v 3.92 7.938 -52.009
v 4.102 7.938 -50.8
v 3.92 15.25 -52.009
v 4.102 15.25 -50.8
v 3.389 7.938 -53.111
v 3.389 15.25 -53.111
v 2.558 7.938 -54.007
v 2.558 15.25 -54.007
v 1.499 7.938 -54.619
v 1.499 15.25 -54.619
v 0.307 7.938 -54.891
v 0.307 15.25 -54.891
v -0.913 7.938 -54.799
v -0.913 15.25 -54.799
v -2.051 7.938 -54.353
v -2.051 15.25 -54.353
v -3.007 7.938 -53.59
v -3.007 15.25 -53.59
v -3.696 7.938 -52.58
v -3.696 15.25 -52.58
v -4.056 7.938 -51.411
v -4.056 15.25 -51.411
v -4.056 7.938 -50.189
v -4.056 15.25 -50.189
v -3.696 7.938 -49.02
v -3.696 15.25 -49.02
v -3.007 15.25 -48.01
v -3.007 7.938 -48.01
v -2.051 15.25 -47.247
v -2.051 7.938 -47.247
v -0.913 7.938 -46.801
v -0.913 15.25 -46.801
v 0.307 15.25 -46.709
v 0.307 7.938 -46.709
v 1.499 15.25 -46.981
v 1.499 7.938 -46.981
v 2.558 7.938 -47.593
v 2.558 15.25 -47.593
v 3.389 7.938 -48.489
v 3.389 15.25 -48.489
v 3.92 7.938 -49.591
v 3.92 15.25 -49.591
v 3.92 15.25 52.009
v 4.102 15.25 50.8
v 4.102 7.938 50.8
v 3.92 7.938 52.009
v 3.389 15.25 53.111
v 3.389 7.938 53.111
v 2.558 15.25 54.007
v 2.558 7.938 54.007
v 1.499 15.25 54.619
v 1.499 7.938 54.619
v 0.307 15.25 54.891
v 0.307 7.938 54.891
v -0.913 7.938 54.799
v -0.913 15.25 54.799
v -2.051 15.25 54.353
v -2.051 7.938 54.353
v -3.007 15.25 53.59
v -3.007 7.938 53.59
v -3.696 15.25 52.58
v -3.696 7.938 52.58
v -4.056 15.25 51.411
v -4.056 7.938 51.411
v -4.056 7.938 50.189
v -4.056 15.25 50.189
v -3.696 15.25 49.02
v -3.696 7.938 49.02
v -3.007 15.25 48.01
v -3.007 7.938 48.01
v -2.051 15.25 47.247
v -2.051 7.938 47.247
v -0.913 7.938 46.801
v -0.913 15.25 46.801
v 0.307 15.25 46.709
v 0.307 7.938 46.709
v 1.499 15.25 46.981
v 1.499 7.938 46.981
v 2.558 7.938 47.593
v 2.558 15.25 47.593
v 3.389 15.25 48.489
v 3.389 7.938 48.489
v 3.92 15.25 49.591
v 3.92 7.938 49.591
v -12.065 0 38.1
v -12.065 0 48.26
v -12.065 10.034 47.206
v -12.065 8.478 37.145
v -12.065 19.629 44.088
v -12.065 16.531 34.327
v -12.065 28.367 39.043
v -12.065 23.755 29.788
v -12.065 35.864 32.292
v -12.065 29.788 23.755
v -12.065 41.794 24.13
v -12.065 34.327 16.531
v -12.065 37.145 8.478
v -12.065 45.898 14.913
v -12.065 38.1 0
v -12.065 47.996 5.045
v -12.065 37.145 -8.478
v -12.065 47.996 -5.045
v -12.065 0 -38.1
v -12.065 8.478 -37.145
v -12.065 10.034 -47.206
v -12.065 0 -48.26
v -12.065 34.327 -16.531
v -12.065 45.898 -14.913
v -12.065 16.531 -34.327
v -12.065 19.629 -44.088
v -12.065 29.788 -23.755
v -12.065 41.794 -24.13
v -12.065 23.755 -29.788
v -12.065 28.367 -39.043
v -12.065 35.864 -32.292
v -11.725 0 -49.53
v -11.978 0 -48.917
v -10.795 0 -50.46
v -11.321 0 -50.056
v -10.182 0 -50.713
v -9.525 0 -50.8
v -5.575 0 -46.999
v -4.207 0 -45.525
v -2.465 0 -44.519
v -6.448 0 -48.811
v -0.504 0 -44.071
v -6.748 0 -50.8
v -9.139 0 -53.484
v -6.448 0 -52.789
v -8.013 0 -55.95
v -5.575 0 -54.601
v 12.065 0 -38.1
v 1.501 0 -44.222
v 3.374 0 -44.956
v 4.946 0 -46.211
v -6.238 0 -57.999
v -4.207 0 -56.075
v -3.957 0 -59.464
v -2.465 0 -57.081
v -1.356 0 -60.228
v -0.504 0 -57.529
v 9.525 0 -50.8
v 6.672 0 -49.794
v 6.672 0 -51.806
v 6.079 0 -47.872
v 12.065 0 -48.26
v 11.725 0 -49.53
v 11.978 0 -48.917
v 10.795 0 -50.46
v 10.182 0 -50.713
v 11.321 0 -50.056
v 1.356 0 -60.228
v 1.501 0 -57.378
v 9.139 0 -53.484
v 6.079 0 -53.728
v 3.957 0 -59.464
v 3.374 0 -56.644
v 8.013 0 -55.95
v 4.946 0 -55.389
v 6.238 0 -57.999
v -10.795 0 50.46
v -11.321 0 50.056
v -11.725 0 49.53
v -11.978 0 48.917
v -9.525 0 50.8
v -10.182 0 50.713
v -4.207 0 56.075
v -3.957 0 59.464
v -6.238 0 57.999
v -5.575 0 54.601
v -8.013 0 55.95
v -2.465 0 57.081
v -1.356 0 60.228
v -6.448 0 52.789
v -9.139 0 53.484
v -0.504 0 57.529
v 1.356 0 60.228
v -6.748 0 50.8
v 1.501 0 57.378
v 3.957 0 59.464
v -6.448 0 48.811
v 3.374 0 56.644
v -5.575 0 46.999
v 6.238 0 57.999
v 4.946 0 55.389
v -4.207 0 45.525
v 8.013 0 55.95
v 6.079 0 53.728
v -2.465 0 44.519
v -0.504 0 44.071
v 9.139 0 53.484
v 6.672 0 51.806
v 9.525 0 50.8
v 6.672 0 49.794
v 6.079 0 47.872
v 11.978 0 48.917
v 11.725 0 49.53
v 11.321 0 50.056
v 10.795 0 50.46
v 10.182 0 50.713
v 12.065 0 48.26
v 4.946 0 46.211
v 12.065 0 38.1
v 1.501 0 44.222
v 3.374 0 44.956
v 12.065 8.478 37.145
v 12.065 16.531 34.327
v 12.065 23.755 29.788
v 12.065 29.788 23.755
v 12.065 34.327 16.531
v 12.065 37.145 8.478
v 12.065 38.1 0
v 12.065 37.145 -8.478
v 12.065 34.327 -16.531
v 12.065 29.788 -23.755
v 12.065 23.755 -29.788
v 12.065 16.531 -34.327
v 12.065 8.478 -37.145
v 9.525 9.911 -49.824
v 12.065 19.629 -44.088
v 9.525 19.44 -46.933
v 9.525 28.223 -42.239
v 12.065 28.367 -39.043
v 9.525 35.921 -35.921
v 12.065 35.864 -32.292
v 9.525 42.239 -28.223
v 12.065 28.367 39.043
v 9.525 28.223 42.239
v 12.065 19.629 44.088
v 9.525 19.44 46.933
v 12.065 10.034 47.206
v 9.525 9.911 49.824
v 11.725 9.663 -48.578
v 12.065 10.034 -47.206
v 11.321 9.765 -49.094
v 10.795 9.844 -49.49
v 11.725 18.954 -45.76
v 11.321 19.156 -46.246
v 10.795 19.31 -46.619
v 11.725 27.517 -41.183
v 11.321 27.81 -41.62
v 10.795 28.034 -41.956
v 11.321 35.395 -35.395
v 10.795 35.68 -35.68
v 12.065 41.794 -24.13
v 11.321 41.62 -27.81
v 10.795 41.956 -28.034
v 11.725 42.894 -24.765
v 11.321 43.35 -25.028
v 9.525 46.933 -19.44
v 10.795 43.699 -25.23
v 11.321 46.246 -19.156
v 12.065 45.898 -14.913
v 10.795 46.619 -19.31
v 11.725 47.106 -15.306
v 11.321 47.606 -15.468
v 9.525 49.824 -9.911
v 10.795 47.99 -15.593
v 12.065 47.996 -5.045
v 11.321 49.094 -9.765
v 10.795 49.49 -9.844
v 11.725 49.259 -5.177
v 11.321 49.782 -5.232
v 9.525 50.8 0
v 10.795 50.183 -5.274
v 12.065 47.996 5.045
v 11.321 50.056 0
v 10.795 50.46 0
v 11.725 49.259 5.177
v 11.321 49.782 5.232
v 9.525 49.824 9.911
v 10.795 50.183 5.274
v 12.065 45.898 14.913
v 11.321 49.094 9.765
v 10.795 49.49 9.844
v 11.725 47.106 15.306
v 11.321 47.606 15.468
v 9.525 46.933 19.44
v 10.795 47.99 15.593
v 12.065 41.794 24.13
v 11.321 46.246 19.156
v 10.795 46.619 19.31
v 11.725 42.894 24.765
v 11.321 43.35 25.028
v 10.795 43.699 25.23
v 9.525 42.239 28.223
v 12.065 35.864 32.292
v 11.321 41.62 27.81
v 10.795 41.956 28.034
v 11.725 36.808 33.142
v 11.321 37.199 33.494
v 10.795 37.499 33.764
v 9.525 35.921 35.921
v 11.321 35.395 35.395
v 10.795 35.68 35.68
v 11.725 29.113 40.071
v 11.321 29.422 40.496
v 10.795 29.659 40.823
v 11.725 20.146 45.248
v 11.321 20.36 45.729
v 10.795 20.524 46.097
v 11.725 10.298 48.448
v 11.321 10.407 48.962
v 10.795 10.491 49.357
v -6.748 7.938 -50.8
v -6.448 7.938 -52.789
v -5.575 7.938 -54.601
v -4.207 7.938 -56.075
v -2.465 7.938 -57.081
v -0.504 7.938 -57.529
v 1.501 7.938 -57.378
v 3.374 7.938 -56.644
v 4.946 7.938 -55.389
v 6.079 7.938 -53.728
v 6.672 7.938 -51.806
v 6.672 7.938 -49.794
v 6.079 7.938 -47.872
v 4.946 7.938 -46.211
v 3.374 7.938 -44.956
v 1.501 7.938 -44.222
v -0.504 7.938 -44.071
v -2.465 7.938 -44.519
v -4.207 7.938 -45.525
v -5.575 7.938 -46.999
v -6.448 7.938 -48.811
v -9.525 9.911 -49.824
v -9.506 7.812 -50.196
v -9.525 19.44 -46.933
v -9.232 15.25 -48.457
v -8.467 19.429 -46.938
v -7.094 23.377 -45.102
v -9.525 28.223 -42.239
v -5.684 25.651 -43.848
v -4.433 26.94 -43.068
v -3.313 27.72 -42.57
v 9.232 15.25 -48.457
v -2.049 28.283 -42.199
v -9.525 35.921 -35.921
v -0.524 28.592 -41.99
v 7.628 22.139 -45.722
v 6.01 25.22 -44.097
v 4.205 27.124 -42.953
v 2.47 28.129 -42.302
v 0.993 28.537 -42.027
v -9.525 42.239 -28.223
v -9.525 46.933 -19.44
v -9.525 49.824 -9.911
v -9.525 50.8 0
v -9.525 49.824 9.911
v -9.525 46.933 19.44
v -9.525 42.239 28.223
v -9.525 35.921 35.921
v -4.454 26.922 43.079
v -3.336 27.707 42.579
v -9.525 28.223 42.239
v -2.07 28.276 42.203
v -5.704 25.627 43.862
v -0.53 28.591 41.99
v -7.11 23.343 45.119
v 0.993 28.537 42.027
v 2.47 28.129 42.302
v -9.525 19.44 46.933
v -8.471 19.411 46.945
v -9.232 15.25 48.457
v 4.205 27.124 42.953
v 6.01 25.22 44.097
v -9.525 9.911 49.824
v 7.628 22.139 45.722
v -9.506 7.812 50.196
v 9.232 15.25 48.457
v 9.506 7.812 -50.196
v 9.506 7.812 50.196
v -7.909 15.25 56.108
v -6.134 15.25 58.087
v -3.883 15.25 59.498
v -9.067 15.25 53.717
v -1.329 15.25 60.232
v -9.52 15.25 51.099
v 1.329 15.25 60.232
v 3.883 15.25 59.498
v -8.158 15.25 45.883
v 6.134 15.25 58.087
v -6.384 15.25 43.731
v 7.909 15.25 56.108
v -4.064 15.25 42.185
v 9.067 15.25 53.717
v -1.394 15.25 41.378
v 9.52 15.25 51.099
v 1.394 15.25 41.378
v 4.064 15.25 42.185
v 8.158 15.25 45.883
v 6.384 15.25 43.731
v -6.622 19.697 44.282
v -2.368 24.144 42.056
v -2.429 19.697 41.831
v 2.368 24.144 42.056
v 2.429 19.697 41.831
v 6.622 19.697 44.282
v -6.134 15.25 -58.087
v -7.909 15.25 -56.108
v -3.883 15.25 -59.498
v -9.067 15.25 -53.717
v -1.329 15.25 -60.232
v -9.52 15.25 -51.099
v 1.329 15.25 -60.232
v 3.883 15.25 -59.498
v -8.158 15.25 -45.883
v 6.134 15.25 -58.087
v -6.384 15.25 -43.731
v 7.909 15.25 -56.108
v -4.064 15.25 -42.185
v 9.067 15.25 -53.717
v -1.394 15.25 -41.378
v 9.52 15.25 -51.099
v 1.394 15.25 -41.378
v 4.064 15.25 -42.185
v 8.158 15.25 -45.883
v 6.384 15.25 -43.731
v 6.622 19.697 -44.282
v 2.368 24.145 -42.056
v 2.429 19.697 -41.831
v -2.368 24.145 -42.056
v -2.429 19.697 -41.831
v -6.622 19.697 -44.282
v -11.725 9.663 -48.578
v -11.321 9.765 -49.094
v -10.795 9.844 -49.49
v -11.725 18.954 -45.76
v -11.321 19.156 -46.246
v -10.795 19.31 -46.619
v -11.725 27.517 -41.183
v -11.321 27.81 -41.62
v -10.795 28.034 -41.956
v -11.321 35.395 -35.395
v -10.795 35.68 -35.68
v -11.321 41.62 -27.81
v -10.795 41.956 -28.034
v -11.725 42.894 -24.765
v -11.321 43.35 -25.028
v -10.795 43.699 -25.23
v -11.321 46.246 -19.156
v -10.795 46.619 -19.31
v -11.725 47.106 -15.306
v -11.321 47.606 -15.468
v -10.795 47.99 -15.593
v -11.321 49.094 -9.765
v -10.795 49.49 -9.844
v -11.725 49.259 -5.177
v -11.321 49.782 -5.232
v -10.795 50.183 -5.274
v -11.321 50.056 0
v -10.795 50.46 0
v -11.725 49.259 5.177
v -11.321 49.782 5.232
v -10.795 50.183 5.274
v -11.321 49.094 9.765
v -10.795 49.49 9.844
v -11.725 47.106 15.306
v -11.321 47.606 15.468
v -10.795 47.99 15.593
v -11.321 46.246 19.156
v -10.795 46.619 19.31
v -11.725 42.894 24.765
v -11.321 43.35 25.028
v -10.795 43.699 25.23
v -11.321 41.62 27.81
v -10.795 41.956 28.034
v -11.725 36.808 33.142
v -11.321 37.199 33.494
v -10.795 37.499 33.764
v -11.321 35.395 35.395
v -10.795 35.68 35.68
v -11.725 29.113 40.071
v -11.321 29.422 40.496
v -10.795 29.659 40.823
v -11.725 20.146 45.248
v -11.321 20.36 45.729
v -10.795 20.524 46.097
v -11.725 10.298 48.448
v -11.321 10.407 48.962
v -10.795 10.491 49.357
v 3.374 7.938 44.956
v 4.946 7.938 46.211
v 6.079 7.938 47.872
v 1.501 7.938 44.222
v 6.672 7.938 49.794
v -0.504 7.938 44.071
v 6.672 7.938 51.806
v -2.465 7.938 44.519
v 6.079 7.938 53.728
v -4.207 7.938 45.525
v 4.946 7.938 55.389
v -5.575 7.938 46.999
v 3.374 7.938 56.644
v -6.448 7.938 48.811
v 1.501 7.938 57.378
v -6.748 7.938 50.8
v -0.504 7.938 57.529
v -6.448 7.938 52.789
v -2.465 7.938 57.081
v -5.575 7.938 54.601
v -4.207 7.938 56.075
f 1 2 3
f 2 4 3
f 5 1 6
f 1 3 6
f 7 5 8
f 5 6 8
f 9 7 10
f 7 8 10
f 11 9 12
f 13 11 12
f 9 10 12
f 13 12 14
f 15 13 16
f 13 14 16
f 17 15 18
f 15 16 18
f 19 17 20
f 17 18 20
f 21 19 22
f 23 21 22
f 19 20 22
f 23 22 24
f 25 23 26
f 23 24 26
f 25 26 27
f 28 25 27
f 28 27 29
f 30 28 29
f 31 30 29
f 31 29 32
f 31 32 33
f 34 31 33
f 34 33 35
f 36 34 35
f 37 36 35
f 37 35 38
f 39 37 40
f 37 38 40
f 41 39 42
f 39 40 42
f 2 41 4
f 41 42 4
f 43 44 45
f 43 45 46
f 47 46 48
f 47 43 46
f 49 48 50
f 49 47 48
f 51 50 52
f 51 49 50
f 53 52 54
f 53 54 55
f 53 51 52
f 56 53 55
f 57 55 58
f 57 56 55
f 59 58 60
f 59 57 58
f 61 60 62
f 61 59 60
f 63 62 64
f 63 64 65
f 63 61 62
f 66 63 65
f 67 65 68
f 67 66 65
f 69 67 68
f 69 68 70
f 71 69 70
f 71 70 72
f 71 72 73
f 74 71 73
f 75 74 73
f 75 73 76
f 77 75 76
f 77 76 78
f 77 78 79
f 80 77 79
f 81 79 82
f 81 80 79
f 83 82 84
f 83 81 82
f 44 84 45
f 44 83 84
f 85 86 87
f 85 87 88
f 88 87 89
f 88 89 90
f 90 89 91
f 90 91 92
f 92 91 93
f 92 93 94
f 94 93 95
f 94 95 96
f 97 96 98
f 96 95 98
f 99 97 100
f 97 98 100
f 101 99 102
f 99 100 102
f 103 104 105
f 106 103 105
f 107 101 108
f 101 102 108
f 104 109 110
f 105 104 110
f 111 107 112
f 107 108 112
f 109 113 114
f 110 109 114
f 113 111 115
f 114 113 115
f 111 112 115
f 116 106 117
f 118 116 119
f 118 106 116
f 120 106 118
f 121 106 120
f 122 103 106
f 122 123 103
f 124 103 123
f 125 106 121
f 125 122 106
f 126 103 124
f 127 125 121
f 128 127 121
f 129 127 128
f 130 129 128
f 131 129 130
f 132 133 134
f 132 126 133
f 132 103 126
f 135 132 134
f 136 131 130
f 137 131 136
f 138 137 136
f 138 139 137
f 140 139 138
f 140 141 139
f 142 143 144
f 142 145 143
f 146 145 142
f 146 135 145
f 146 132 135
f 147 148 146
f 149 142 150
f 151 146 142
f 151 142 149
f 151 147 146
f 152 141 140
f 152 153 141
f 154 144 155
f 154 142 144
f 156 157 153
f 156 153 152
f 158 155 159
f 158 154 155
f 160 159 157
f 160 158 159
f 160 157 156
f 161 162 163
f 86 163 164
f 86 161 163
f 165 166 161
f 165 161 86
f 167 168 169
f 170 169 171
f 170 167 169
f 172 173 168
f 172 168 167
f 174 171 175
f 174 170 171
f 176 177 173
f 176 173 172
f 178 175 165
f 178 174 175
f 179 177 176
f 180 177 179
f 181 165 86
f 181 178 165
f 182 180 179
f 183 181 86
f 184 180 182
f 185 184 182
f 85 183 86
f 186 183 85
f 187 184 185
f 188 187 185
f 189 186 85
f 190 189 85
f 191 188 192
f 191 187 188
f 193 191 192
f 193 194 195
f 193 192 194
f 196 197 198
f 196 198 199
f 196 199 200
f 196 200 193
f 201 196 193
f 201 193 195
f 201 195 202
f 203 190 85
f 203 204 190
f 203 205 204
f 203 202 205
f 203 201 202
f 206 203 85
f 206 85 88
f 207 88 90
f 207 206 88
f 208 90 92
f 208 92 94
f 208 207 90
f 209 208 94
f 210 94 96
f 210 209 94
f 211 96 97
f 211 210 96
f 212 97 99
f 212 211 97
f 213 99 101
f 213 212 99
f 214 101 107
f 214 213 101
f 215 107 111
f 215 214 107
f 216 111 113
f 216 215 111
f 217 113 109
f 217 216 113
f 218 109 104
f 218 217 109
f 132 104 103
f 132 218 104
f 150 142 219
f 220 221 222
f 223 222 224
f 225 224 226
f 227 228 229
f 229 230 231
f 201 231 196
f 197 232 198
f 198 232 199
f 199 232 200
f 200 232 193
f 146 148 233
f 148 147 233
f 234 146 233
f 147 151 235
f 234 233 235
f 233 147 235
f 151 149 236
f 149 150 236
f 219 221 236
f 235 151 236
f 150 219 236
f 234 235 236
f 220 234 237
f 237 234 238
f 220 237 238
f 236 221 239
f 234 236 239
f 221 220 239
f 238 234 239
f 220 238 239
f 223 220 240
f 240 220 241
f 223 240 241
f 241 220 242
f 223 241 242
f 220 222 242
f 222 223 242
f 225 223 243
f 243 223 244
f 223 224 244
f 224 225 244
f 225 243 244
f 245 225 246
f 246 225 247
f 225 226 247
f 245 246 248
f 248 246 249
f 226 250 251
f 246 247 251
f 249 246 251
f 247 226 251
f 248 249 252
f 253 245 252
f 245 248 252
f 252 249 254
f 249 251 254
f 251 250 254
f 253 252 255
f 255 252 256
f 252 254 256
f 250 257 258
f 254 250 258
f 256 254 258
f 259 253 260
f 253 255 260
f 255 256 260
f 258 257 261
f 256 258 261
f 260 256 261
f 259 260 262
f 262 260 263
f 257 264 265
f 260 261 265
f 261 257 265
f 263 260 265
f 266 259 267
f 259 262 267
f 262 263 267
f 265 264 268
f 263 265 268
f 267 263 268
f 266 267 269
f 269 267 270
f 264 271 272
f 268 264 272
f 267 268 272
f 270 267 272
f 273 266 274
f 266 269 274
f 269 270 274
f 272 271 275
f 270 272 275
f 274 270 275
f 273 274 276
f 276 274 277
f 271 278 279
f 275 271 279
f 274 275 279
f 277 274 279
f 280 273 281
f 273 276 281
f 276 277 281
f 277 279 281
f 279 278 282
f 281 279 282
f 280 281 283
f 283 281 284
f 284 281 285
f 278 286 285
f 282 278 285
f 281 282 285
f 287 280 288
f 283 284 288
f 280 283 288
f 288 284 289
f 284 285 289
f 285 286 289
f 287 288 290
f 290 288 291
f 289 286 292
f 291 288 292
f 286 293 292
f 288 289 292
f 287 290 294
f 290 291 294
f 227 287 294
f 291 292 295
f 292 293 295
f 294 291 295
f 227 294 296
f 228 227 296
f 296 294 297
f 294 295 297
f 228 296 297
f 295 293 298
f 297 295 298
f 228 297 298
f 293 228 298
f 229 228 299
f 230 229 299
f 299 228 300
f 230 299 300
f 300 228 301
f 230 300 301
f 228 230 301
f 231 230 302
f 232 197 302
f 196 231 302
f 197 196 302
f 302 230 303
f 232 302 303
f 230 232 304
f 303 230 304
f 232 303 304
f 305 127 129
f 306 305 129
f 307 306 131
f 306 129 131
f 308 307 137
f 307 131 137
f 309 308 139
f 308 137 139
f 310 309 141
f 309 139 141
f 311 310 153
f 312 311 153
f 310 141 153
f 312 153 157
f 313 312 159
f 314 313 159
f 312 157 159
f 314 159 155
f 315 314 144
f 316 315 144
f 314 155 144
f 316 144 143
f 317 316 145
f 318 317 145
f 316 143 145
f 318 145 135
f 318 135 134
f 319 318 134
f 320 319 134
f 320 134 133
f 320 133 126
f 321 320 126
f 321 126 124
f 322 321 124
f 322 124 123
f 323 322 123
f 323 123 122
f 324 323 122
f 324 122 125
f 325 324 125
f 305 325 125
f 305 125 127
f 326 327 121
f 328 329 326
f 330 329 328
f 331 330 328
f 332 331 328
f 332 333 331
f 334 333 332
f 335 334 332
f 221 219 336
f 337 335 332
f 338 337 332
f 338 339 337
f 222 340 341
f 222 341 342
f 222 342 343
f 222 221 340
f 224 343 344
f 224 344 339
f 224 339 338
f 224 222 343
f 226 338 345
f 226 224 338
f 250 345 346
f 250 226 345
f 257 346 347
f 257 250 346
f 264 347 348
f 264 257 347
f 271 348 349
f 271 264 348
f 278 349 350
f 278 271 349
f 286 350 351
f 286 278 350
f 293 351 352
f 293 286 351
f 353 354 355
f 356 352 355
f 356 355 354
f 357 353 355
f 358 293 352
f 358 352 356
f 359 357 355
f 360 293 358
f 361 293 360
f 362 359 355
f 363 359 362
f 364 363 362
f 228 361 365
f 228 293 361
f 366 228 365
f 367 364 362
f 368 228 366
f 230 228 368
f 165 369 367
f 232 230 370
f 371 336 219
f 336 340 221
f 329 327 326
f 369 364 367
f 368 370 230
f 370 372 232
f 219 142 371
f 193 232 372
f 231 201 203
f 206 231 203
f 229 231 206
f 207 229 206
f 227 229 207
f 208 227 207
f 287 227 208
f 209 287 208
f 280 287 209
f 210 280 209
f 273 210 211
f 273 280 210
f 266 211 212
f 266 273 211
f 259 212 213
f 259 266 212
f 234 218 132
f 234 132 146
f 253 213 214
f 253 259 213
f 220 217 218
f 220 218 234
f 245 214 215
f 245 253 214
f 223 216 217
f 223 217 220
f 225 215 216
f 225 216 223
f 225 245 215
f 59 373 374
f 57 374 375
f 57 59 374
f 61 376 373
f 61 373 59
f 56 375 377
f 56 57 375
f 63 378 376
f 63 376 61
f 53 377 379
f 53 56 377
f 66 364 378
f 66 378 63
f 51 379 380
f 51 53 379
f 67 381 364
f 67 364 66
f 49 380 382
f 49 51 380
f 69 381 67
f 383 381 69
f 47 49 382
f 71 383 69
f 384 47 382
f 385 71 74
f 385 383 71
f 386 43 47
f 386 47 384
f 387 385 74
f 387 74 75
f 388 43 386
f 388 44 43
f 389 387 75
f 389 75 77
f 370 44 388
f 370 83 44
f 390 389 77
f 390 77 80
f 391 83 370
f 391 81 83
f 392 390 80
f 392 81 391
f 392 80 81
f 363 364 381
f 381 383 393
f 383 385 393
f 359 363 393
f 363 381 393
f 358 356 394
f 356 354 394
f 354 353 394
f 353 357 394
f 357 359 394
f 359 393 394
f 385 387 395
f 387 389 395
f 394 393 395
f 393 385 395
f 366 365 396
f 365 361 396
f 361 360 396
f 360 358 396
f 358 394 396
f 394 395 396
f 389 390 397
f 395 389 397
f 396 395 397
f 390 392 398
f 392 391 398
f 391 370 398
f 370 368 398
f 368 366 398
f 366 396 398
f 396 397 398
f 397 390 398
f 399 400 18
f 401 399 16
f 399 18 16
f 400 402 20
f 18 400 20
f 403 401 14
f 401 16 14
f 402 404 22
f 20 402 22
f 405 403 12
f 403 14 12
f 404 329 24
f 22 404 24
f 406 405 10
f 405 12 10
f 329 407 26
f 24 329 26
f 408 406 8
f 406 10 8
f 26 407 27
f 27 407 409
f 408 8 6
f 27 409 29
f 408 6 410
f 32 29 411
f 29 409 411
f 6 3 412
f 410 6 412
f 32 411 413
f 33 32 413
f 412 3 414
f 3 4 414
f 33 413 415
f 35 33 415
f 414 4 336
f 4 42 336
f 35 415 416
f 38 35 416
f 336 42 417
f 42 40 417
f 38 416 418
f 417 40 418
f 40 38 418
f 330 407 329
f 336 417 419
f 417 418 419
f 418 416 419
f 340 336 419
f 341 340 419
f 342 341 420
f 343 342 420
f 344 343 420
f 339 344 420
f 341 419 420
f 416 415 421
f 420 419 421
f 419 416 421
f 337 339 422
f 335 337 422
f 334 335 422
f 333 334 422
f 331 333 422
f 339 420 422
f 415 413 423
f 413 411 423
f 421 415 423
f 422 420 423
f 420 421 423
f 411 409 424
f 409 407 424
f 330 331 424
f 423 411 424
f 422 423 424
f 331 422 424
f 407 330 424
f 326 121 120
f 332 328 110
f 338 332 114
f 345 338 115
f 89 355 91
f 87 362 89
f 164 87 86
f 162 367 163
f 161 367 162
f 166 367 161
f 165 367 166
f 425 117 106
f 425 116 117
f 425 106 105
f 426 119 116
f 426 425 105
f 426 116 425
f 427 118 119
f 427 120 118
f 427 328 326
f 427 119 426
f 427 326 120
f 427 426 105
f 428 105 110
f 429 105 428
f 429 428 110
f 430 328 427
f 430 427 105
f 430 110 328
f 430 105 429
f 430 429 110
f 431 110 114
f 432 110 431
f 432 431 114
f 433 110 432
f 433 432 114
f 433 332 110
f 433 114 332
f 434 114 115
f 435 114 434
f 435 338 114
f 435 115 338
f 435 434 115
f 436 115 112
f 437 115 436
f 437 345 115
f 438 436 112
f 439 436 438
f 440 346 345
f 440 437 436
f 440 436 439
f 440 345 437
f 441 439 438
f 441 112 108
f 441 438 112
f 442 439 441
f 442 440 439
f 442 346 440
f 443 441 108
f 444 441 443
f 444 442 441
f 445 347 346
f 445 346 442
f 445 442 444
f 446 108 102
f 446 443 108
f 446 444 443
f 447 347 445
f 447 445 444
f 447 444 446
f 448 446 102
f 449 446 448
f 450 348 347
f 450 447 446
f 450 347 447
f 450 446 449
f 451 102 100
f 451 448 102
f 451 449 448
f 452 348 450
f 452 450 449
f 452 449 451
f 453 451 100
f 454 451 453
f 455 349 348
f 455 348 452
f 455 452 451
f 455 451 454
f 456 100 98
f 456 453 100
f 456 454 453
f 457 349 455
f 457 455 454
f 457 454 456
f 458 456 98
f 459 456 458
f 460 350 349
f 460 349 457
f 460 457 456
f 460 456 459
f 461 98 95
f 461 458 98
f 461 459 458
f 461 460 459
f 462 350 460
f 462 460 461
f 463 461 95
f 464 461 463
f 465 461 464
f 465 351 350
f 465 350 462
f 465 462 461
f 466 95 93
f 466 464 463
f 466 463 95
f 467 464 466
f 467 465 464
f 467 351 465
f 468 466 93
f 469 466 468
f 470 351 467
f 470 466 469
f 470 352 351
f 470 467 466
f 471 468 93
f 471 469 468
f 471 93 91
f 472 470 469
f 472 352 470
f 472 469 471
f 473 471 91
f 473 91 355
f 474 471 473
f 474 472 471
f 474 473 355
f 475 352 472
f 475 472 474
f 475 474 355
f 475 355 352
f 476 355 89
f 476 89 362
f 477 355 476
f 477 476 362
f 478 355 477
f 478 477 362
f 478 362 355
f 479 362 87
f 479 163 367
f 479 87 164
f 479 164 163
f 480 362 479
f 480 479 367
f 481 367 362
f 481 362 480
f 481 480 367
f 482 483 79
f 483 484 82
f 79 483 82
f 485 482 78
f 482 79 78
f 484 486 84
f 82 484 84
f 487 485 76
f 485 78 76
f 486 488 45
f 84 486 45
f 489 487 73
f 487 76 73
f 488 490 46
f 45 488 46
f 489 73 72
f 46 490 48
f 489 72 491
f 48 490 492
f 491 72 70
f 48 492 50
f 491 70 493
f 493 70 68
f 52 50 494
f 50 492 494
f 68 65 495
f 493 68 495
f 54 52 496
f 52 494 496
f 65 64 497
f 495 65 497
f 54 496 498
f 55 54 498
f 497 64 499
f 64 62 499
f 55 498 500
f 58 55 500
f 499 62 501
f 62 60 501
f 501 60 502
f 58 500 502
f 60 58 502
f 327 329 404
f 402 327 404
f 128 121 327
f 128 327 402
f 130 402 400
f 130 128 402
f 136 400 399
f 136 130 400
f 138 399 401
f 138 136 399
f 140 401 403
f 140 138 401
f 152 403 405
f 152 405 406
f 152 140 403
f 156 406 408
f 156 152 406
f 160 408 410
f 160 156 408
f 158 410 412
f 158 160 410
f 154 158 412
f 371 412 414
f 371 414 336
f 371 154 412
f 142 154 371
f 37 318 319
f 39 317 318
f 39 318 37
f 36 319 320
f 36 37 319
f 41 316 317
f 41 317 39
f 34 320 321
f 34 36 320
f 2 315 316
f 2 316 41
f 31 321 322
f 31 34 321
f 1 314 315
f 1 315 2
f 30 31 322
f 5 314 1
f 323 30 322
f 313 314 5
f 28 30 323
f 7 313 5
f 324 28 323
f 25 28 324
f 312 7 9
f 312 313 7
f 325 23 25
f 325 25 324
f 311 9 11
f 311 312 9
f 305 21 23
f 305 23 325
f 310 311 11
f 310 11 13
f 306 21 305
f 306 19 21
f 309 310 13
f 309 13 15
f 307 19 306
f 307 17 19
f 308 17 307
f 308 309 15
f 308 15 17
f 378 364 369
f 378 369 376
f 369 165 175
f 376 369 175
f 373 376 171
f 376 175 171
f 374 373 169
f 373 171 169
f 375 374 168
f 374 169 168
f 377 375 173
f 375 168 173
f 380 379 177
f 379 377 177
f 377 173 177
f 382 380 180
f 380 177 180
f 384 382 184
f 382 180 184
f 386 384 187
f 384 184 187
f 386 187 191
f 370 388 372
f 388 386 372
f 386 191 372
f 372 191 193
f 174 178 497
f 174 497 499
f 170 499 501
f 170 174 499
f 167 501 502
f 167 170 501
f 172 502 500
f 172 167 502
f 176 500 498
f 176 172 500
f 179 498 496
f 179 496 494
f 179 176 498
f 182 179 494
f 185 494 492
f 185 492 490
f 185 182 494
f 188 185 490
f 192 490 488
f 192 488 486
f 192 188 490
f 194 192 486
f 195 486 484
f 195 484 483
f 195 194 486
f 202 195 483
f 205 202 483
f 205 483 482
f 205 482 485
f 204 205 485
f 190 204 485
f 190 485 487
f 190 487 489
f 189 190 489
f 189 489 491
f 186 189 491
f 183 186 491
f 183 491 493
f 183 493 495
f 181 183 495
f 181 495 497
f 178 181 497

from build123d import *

# Parameters (mm, degrees)
BOSS_EXTRUDE1_DEPTH                               = 12.065
SKETCH2_R                                         = 9.525
BOSS_EXTRUDE2_DEPTH                               = 15.25
CUT_EXTRUDE1_START                                = -15.25
SKETCH2_2_R                                       = 9.525
CUT_EXTRUDE1_DEPTH                                = 15.25
CUT_EXTRUDE1_DRAFT                                = -3
CBORE_FOR_5_16_SOCKET_HEAD_CAP_SCREW1_D           = 8.2042
CBORE_FOR_5_16_SOCKET_HEAD_CAP_SCREW1_CBORE_D     = 13.49502
CBORE_FOR_5_16_SOCKET_HEAD_CAP_SCREW1_CBORE_DEPTH = 7.9375
MIRROR2_START                                     = -15.25
MIRROR2_COPY_1_SKETCH_R                           = 9.525
MIRROR2_COPY_1_DEPTH                              = 15.25
MIRROR2_COPY_1_DRAFT                              = -3
FILLET1_R                                         = 2.54


with BuildPart() as part:
    # Sketch1 → Boss-Extrude1 (new, symmetric)
    with BuildSketch(Plane(origin=(0, 0, 0), x_dir=(0, 0, -1), z_dir=(1, 0, 0))):
        with BuildLine():
            Line((-50.8, 0), (-38.1, 0))
            ThreePointArc((-38.1, 0), (0, 38.1), (38.1, 0))
            Line((38.1, 0), (50.8, 0))
            ThreePointArc((50.8, 0), (0, 50.8), (-50.8, 0))
        make_face()
    extrude(amount=BOSS_EXTRUDE1_DEPTH, both=True)

    # Sketch2 → Boss-Extrude2 (add)
    with BuildSketch(Plane.XZ):
        with Locations((0, -50.8)):
            Circle(SKETCH2_R)
    boss_extrude2 = extrude(amount=-BOSS_EXTRUDE2_DEPTH)


with BuildPart() as cut_extrude1_tool:
    # Sketch2<2> → Cut-Extrude1 (with draft: the straight prism first)
    with BuildSketch(Plane.XZ.offset(CUT_EXTRUDE1_START)):
        with Locations((0, -50.8)):
            Circle(SKETCH2_2_R)
    extrude(amount=-CUT_EXTRUDE1_DEPTH)
    # Cut-Extrude1: the draft: its side faces are tilted about the plane it starts from
    cut_extrude1_sides = [cut_extrude1_tool.faces().sort_by_distance(p)[0] for p in [
        (-9.525, 22.875, -50.8),
    ]]
    draft(cut_extrude1_sides, Plane.XZ.offset(CUT_EXTRUDE1_START), CUT_EXTRUDE1_DRAFT)


with BuildPart() as part_1:
    add(part.part)

    # Cut-Extrude1: cut by cut_extrude1_tool
    add(cut_extrude1_tool.part, mode=Mode.SUBTRACT)

    # CBORE for 5/16 Socket Head Cap Screw1 (through all)
    with Locations(Plane(origin=(0, 0, 0), x_dir=(-1, 0, 0), z_dir=(0, -1, 0))):
        with Locations((0, 50.8)):
            cbore_for_5_16_socket_head_cap_screw1 = CounterBoreHole(CBORE_FOR_5_16_SOCKET_HEAD_CAP_SCREW1_D / 2, CBORE_FOR_5_16_SOCKET_HEAD_CAP_SCREW1_CBORE_D / 2, CBORE_FOR_5_16_SOCKET_HEAD_CAP_SCREW1_CBORE_DEPTH)

    # Mirror1: Boss-Extrude2, CBORE for 5/16 Socket Head Cap Screw1 across plane
    add(boss_extrude2.mirror(Plane.XY))
    add(cbore_for_5_16_socket_head_cap_screw1.mirror(Plane.XY), mode=Mode.SUBTRACT)


with BuildPart() as mirror2_copy_1_tool:
    # Mirror2 copy 1 sketch → Mirror2 copy 1 (with draft: the straight prism first)
    with BuildSketch(Plane.XZ.offset(MIRROR2_START)):
        with Locations((0, 50.8)):
            Circle(MIRROR2_COPY_1_SKETCH_R)
    extrude(amount=-MIRROR2_COPY_1_DEPTH)
    # Mirror2 copy 1: the draft: its side faces are tilted about the plane it starts from
    mirror2_copy_1_sides = [mirror2_copy_1_tool.faces().sort_by_distance(p)[0] for p in [
        (-9.525, 22.875, 50.8),
    ]]
    draft(mirror2_copy_1_sides, Plane.XZ.offset(MIRROR2_START), MIRROR2_COPY_1_DRAFT)


with BuildPart() as part_2:
    add(part_1.part)

    # Mirror2 copy 1: cut by mirror2_copy_1_tool
    add(mirror2_copy_1_tool.part, mode=Mode.SUBTRACT)

    # Fillet1
    fillet1_edges = [part_2.edges().sort_by_distance(p)[0] for p in [
        (12.065, 50.8, 0),
        (-12.065, 50.8, 0),
    ]]
    fillet(fillet1_edges, radius=FILLET1_R - 0.0001)  # a hair under: the kernel refuses the full size


solid = part_2.part
